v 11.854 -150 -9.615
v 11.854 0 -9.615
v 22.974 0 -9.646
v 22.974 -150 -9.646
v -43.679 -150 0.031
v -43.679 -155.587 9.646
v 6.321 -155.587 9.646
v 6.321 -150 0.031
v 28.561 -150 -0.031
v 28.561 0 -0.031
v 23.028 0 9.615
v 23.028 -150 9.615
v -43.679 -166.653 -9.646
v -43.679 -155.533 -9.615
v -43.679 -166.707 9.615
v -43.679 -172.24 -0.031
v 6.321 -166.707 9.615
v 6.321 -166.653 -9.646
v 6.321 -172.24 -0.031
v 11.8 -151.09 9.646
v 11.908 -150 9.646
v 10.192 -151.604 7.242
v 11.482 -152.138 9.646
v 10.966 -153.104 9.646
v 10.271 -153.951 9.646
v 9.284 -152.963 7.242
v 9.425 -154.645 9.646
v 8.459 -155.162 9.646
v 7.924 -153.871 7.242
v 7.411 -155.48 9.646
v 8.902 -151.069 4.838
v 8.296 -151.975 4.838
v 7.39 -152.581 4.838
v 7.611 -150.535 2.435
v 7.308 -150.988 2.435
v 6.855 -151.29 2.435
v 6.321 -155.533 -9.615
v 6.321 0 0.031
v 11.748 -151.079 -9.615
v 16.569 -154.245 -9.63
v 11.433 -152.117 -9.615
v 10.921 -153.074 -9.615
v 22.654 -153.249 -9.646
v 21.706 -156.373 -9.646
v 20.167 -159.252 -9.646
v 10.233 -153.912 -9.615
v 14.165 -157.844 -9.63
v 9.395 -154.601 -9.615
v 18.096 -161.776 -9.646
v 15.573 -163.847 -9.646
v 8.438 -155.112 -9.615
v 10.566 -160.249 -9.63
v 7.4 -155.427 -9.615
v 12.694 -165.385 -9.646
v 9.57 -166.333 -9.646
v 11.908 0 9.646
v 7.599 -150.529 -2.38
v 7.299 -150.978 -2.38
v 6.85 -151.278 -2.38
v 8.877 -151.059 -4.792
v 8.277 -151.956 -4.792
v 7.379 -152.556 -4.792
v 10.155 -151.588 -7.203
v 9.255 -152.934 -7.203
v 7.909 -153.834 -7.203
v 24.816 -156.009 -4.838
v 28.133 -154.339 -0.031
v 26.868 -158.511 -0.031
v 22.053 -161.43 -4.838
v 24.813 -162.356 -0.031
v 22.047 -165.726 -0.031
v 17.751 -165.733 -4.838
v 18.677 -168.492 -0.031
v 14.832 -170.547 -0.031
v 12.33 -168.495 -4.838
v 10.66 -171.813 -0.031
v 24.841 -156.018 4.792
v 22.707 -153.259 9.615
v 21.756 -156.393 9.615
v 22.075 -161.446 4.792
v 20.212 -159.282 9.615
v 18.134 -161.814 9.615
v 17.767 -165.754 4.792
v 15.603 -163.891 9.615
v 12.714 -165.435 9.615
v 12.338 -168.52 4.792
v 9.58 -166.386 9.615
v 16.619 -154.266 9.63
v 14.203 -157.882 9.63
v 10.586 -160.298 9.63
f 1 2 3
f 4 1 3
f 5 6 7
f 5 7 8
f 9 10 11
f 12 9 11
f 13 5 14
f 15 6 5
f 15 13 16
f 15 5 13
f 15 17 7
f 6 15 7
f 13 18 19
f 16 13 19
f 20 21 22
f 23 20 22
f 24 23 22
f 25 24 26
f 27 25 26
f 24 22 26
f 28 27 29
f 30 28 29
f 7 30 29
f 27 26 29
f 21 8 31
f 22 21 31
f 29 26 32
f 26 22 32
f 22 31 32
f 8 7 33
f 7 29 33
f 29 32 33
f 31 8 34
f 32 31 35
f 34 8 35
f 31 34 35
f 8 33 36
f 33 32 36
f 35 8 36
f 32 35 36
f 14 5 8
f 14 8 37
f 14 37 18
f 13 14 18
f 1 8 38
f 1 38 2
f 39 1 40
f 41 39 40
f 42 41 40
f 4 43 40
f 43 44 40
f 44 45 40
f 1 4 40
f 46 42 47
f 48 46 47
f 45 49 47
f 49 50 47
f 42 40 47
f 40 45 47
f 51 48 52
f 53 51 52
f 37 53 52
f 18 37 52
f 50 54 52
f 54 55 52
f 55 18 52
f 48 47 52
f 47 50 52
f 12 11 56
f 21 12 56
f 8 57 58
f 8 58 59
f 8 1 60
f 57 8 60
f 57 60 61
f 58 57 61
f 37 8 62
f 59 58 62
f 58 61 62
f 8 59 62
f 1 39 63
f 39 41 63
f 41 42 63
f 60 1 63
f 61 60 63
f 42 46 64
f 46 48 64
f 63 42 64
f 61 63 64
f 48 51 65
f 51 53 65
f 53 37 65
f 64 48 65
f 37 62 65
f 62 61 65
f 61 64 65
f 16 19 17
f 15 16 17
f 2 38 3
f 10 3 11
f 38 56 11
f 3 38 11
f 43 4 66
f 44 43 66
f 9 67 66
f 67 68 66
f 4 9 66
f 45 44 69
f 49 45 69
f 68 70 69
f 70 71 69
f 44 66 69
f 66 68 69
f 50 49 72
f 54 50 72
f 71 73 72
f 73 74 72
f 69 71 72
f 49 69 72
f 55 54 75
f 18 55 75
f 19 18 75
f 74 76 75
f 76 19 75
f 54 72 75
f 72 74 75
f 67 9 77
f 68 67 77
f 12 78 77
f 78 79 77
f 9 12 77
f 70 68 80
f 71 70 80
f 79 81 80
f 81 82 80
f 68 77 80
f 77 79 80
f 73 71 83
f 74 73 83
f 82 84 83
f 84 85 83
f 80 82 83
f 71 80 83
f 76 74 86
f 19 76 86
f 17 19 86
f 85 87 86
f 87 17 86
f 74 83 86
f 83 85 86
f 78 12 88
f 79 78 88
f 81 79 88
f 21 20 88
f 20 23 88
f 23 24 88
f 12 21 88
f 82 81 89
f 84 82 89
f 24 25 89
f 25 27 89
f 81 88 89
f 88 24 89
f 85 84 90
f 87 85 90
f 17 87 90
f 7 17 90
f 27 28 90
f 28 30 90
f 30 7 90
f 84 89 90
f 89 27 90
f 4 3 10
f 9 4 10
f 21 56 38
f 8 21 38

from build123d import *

# Parameters (mm, degrees)
F1_DEPTH = 150
F3_ANGLE = 90
F4_DEPTH = 50


with BuildPart() as f1:
    # F0 (on Front) → F1 (new body)
    with BuildSketch(Plane.XZ):
        Polygon((22.9738393507, -9.6457333625), (28.5607396108, -0.0310617447), (23.0276398708, 9.6146716177), (11.9076398708, 9.6457333625), (6.3207396108, 0.0310617447), (11.8538393507, -9.6146716177), align=None)
    extrude(amount=F1_DEPTH)

    # F2 (on face) → F3 (revolve)
    with BuildSketch(Plane.XZ.offset(150)):
        Polygon((11.9076398708, 9.6457333625), (6.3207396108, 0.0310617447), (11.8538393507, -9.6146716177), (22.9738393507, -9.6457333625), (28.5607396108, -0.0310617447), (23.0276398708, 9.6146716177), align=None)
    revolve(axis=Axis((6.3207396108, -150, 14.933847028), (0, 0, -1)), revolution_arc=F3_ANGLE)

    # F4 (add): a face of the model
    f4_faces = [f1.faces().sort_by_distance(p)[0] for p in [
        (6.3207396108, -161.12, 0),
    ]]
    extrude(f4_faces, amount=F4_DEPTH)


solid = f1.part
